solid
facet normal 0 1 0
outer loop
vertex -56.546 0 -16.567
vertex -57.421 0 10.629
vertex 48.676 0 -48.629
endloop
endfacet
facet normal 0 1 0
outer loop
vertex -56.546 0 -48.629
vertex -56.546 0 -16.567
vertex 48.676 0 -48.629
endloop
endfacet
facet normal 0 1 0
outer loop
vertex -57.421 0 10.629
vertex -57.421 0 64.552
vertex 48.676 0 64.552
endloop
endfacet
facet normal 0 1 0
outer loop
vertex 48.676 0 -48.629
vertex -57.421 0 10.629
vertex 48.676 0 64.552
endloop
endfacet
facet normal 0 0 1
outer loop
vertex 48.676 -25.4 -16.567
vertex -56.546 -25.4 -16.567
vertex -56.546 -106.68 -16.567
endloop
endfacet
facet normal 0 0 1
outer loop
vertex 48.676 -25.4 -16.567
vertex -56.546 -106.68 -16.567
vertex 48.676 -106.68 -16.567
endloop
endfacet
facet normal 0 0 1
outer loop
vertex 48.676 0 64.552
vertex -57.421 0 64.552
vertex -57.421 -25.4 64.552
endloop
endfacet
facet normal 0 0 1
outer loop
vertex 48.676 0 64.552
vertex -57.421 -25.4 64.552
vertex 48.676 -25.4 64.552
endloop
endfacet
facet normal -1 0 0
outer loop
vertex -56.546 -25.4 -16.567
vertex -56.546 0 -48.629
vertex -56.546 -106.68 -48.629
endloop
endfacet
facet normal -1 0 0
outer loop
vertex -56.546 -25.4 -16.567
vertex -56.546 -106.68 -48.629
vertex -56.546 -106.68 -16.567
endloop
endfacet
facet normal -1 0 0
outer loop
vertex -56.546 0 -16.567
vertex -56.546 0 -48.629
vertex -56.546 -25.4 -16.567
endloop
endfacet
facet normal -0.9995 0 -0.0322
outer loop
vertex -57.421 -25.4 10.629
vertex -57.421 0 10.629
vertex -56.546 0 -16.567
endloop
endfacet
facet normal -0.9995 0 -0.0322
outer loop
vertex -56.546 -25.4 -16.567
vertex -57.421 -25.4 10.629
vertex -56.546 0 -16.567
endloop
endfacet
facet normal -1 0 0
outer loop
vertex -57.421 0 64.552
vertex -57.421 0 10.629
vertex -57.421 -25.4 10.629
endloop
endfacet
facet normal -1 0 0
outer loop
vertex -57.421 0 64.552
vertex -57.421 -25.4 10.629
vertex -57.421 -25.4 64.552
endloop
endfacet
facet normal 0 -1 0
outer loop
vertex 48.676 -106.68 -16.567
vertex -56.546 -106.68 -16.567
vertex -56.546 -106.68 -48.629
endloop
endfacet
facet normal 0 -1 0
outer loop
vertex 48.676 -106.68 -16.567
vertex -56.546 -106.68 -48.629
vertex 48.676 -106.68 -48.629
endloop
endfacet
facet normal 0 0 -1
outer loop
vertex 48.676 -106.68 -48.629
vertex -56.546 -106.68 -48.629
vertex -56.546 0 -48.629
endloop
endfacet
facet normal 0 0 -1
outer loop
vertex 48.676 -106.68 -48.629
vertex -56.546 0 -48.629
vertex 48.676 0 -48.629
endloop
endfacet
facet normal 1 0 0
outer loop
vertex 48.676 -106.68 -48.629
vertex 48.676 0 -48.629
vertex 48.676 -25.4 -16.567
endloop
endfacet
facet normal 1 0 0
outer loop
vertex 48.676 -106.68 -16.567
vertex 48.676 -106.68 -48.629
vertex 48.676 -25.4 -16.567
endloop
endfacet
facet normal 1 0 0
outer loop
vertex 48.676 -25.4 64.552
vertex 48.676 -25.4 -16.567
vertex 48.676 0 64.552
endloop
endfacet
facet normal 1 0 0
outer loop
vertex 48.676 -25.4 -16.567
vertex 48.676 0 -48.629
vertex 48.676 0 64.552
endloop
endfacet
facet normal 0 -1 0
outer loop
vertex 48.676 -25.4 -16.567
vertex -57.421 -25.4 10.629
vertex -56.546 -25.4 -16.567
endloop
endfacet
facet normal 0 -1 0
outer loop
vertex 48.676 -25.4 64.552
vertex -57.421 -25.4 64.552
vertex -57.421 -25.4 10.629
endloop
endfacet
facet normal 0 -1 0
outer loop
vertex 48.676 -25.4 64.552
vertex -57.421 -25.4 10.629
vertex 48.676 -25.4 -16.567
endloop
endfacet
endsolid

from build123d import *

# Parameters (mm, degrees)
F0_W     = 105.22262
F0_H     = 32.062296
F1_DEPTH = 106.68
F0_W_2   = 106.097046
F0_H_2   = 53.922951
F2_DEPTH = 25.4
F3_DEPTH = 25.4


with BuildPart() as f1:
    # F0 (on Front) → F1 (new body)
    with BuildSketch(Plane.XZ):
        with Locations((-3.93492, -32.597718)):
            Rectangle(F0_W, F0_H)
    extrude(amount=F1_DEPTH)

    # F0 (on Front) → F2 (join)
    with BuildSketch(Plane.XZ):
        with Locations((-4.372133, 37.590868)):
            Rectangle(F0_W_2, F0_H_2)
        Polygon((48.67639, 10.629393), (-57.420656, 10.629393), (-56.54623, -16.56657), (48.67639, -16.56657), align=None)
        with Locations((-3.93492, -32.597718)):
            Rectangle(F0_W, F0_H)
    extrude(amount=F2_DEPTH)

    # F0 (on Front) → F3 (join)
    with BuildSketch(Plane.XZ):
        with Locations((-4.372133, 37.590868)):
            Rectangle(F0_W_2, F0_H_2)
        Polygon((48.67639, 10.629393), (-57.420656, 10.629393), (-56.54623, -16.56657), (48.67639, -16.56657), align=None)
        with Locations((-3.93492, -32.597718)):
            Rectangle(F0_W, F0_H)
    extrude(amount=F3_DEPTH)


solid = f1.part
